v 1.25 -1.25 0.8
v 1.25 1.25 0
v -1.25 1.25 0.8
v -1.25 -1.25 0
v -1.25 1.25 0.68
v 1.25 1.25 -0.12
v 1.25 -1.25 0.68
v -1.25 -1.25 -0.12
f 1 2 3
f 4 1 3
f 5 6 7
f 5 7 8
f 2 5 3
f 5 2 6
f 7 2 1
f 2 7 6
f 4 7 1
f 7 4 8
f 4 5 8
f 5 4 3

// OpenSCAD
// Shed shell kit: roof saddle. See lib/lodge_kit.scad.
include <lib/lodge_kit.scad>
kind = "shed";
roof_tile([1, 0, 1, 0], 0);
